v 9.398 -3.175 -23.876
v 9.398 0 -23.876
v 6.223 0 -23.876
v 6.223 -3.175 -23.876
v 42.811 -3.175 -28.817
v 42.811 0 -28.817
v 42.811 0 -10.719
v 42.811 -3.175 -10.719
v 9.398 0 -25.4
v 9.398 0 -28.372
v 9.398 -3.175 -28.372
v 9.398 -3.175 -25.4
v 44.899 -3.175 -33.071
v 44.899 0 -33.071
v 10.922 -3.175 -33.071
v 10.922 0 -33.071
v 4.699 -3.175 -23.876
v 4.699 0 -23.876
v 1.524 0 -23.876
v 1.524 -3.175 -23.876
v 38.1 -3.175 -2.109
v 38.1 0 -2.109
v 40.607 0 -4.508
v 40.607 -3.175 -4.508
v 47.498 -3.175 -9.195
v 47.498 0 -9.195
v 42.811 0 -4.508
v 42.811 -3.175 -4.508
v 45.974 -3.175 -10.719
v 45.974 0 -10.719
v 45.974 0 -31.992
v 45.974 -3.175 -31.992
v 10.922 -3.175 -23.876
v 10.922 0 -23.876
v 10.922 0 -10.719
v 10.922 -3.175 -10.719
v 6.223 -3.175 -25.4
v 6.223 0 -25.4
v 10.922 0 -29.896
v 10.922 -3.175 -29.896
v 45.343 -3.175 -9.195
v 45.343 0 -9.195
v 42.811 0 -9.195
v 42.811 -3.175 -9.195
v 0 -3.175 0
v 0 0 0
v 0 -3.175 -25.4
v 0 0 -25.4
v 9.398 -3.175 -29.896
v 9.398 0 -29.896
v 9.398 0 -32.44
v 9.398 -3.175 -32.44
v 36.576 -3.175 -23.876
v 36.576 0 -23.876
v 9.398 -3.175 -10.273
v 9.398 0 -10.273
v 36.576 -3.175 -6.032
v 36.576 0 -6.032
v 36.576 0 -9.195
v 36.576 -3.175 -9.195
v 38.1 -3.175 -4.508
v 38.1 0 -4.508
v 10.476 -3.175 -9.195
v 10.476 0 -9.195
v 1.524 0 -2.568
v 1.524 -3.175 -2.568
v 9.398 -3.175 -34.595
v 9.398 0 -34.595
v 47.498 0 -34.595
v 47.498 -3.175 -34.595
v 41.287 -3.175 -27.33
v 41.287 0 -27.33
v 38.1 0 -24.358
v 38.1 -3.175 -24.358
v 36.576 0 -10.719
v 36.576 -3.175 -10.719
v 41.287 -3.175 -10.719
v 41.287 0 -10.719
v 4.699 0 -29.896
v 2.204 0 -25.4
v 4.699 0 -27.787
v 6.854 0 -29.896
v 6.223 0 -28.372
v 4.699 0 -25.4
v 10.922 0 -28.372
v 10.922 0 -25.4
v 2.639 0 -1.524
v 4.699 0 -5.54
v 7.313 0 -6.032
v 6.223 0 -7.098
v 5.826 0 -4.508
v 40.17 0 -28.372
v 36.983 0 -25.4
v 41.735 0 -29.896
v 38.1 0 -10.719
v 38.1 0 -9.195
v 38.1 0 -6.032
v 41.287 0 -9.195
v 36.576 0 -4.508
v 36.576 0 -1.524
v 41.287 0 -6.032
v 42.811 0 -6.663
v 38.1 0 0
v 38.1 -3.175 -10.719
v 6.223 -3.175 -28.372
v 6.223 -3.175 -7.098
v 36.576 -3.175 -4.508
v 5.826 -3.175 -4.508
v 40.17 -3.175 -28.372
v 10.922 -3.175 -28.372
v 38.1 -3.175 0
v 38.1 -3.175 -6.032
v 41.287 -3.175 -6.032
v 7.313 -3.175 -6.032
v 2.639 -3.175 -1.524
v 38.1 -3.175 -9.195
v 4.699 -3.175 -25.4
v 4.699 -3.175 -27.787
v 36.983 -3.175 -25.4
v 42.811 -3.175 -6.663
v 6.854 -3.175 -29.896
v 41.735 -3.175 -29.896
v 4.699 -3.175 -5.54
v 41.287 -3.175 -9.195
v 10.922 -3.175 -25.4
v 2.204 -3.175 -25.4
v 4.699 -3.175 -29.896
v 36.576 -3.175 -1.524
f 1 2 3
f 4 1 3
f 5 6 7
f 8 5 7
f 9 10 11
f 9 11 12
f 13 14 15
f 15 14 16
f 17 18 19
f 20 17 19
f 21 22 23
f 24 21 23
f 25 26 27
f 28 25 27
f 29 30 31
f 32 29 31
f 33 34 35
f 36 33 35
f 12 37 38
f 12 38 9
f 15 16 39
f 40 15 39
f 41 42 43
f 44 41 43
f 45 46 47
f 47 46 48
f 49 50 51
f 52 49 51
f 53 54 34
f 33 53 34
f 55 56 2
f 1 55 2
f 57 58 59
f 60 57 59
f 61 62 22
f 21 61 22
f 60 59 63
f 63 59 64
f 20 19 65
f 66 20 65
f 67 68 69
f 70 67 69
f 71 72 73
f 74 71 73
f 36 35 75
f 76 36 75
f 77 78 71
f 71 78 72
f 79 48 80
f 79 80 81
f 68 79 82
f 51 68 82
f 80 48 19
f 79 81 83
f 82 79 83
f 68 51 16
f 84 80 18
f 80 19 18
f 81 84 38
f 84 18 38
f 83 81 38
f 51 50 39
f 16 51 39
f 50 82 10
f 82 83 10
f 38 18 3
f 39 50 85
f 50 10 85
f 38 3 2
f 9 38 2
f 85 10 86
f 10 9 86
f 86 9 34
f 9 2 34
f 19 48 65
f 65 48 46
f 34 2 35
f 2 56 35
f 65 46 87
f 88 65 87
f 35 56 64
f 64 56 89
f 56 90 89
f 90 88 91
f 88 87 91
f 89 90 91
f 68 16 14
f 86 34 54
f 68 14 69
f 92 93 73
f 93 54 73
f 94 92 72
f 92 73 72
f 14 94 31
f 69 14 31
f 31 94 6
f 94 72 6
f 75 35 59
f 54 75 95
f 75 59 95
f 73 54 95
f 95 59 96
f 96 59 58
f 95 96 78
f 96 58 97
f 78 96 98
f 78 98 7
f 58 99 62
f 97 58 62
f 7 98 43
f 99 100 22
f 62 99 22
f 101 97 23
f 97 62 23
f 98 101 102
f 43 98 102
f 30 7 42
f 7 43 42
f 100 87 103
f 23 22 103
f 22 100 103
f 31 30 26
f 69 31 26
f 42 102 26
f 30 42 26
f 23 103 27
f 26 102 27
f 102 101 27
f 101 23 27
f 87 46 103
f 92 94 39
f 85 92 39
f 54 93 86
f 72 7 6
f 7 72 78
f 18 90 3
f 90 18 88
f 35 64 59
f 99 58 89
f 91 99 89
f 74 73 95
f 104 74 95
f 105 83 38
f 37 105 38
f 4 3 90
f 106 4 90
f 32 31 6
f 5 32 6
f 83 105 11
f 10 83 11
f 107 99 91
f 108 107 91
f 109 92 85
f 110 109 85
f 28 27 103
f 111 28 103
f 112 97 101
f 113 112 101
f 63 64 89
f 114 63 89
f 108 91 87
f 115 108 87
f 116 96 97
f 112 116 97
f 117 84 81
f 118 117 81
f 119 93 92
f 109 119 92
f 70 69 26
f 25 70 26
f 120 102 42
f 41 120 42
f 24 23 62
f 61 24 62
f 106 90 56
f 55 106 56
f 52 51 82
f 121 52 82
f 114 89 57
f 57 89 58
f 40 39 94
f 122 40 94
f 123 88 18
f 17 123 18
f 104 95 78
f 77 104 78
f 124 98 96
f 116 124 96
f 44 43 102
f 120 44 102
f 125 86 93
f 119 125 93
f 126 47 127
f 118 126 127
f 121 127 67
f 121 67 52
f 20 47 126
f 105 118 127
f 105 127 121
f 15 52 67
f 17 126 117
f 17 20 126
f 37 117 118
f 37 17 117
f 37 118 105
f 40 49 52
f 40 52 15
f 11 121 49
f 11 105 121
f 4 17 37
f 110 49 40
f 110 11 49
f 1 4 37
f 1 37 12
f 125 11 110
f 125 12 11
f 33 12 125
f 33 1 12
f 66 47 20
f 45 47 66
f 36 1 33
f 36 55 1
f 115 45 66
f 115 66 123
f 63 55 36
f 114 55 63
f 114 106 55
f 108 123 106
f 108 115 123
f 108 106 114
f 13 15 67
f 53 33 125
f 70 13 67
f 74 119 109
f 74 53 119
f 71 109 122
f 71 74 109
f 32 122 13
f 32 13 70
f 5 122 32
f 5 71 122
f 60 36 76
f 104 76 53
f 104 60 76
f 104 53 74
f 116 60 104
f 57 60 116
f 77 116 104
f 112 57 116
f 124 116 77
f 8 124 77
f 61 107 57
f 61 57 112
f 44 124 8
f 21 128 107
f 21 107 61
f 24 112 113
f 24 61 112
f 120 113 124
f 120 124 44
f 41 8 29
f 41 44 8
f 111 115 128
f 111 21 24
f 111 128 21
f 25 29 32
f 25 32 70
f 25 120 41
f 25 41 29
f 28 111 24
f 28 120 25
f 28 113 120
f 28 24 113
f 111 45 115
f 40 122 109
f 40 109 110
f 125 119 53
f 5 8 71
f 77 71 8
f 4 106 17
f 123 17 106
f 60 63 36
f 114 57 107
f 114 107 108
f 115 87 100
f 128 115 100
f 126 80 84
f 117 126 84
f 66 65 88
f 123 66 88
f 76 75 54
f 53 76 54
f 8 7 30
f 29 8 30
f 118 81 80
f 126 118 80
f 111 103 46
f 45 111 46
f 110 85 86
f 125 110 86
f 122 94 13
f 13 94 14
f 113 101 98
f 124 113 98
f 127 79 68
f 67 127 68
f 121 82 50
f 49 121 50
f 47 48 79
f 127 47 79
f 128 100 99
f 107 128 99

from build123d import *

# Parameters (mm, degrees)
F0_W     = 3.175
F0_H     = 2.972425
F1_DEPTH = 3.175


with BuildPart() as f1:
    # F0 (on Front) → F1 (new body)
    with BuildSketch(Plane.XZ):
        Polygon((38.1, 0), (0, 0), (0, -25.4), (4.699, -29.896425), (9.398, -34.595425), (47.498261, -34.595164), (47.498261, -9.195164), (42.811127, -4.508029), align=None)
        Polygon((9.398, -32.440164), (6.854261, -29.896425), (9.398, -29.896425), align=None, mode=Mode.SUBTRACT)
        Polygon((4.699, -27.787109), (2.204346, -25.4), (4.699, -25.4), align=None, mode=Mode.SUBTRACT)
        with Locations((7.8105, -26.886212)):
            Rectangle(F0_W, F0_H, mode=Mode.SUBTRACT)
        Polygon((44.898607, -33.071182), (10.922, -33.071415), (10.922, -29.896425), (41.735466, -29.896425), align=None, mode=Mode.SUBTRACT)
        Polygon((10.922, -28.372425), (10.922, -25.4), (36.982772, -25.4), (40.169899, -28.372425), align=None, mode=Mode.SUBTRACT)
        Polygon((38.1, -24.358034), (38.1, -10.719228), (41.287127, -10.719206), (41.287127, -27.330459), align=None, mode=Mode.SUBTRACT)
        Polygon((42.811127, -10.719196), (45.974261, -10.719174), (45.974261, -31.991563), (42.811127, -28.816814), align=None, mode=Mode.SUBTRACT)
        Polygon((1.524, -23.876), (1.524, -2.567819), (4.699, -5.540244), (4.699, -23.876), align=None, mode=Mode.SUBTRACT)
        Polygon((6.223, -23.876), (6.223, -7.098056), (9.398, -10.273056), (9.398, -23.876), align=None, mode=Mode.SUBTRACT)
        Polygon((10.922, -23.876), (10.922, -10.719415), (36.576, -10.719239), (36.576, -23.876), align=None, mode=Mode.SUBTRACT)
        Polygon((10.475892, -9.195418), (7.312758, -6.032029), (36.576, -6.032029), (36.576, -9.195239), align=None, mode=Mode.SUBTRACT)
        Polygon((5.826084, -4.508029), (2.638957, -1.524), (36.576, -1.524), (36.576, -4.508029), align=None, mode=Mode.SUBTRACT)
        Polygon((38.1, -6.032029), (41.287127, -6.032029), (41.287127, -9.195206), (38.1, -9.195228), align=None, mode=Mode.SUBTRACT)
        Polygon((42.811127, -9.195196), (42.811127, -6.663291), (45.343015, -9.195178), align=None, mode=Mode.SUBTRACT)
        Polygon((38.1, -4.508029), (38.1, -2.109316), (40.606781, -4.508029), align=None, mode=Mode.SUBTRACT)
    extrude(amount=F1_DEPTH)


solid = f1.part
